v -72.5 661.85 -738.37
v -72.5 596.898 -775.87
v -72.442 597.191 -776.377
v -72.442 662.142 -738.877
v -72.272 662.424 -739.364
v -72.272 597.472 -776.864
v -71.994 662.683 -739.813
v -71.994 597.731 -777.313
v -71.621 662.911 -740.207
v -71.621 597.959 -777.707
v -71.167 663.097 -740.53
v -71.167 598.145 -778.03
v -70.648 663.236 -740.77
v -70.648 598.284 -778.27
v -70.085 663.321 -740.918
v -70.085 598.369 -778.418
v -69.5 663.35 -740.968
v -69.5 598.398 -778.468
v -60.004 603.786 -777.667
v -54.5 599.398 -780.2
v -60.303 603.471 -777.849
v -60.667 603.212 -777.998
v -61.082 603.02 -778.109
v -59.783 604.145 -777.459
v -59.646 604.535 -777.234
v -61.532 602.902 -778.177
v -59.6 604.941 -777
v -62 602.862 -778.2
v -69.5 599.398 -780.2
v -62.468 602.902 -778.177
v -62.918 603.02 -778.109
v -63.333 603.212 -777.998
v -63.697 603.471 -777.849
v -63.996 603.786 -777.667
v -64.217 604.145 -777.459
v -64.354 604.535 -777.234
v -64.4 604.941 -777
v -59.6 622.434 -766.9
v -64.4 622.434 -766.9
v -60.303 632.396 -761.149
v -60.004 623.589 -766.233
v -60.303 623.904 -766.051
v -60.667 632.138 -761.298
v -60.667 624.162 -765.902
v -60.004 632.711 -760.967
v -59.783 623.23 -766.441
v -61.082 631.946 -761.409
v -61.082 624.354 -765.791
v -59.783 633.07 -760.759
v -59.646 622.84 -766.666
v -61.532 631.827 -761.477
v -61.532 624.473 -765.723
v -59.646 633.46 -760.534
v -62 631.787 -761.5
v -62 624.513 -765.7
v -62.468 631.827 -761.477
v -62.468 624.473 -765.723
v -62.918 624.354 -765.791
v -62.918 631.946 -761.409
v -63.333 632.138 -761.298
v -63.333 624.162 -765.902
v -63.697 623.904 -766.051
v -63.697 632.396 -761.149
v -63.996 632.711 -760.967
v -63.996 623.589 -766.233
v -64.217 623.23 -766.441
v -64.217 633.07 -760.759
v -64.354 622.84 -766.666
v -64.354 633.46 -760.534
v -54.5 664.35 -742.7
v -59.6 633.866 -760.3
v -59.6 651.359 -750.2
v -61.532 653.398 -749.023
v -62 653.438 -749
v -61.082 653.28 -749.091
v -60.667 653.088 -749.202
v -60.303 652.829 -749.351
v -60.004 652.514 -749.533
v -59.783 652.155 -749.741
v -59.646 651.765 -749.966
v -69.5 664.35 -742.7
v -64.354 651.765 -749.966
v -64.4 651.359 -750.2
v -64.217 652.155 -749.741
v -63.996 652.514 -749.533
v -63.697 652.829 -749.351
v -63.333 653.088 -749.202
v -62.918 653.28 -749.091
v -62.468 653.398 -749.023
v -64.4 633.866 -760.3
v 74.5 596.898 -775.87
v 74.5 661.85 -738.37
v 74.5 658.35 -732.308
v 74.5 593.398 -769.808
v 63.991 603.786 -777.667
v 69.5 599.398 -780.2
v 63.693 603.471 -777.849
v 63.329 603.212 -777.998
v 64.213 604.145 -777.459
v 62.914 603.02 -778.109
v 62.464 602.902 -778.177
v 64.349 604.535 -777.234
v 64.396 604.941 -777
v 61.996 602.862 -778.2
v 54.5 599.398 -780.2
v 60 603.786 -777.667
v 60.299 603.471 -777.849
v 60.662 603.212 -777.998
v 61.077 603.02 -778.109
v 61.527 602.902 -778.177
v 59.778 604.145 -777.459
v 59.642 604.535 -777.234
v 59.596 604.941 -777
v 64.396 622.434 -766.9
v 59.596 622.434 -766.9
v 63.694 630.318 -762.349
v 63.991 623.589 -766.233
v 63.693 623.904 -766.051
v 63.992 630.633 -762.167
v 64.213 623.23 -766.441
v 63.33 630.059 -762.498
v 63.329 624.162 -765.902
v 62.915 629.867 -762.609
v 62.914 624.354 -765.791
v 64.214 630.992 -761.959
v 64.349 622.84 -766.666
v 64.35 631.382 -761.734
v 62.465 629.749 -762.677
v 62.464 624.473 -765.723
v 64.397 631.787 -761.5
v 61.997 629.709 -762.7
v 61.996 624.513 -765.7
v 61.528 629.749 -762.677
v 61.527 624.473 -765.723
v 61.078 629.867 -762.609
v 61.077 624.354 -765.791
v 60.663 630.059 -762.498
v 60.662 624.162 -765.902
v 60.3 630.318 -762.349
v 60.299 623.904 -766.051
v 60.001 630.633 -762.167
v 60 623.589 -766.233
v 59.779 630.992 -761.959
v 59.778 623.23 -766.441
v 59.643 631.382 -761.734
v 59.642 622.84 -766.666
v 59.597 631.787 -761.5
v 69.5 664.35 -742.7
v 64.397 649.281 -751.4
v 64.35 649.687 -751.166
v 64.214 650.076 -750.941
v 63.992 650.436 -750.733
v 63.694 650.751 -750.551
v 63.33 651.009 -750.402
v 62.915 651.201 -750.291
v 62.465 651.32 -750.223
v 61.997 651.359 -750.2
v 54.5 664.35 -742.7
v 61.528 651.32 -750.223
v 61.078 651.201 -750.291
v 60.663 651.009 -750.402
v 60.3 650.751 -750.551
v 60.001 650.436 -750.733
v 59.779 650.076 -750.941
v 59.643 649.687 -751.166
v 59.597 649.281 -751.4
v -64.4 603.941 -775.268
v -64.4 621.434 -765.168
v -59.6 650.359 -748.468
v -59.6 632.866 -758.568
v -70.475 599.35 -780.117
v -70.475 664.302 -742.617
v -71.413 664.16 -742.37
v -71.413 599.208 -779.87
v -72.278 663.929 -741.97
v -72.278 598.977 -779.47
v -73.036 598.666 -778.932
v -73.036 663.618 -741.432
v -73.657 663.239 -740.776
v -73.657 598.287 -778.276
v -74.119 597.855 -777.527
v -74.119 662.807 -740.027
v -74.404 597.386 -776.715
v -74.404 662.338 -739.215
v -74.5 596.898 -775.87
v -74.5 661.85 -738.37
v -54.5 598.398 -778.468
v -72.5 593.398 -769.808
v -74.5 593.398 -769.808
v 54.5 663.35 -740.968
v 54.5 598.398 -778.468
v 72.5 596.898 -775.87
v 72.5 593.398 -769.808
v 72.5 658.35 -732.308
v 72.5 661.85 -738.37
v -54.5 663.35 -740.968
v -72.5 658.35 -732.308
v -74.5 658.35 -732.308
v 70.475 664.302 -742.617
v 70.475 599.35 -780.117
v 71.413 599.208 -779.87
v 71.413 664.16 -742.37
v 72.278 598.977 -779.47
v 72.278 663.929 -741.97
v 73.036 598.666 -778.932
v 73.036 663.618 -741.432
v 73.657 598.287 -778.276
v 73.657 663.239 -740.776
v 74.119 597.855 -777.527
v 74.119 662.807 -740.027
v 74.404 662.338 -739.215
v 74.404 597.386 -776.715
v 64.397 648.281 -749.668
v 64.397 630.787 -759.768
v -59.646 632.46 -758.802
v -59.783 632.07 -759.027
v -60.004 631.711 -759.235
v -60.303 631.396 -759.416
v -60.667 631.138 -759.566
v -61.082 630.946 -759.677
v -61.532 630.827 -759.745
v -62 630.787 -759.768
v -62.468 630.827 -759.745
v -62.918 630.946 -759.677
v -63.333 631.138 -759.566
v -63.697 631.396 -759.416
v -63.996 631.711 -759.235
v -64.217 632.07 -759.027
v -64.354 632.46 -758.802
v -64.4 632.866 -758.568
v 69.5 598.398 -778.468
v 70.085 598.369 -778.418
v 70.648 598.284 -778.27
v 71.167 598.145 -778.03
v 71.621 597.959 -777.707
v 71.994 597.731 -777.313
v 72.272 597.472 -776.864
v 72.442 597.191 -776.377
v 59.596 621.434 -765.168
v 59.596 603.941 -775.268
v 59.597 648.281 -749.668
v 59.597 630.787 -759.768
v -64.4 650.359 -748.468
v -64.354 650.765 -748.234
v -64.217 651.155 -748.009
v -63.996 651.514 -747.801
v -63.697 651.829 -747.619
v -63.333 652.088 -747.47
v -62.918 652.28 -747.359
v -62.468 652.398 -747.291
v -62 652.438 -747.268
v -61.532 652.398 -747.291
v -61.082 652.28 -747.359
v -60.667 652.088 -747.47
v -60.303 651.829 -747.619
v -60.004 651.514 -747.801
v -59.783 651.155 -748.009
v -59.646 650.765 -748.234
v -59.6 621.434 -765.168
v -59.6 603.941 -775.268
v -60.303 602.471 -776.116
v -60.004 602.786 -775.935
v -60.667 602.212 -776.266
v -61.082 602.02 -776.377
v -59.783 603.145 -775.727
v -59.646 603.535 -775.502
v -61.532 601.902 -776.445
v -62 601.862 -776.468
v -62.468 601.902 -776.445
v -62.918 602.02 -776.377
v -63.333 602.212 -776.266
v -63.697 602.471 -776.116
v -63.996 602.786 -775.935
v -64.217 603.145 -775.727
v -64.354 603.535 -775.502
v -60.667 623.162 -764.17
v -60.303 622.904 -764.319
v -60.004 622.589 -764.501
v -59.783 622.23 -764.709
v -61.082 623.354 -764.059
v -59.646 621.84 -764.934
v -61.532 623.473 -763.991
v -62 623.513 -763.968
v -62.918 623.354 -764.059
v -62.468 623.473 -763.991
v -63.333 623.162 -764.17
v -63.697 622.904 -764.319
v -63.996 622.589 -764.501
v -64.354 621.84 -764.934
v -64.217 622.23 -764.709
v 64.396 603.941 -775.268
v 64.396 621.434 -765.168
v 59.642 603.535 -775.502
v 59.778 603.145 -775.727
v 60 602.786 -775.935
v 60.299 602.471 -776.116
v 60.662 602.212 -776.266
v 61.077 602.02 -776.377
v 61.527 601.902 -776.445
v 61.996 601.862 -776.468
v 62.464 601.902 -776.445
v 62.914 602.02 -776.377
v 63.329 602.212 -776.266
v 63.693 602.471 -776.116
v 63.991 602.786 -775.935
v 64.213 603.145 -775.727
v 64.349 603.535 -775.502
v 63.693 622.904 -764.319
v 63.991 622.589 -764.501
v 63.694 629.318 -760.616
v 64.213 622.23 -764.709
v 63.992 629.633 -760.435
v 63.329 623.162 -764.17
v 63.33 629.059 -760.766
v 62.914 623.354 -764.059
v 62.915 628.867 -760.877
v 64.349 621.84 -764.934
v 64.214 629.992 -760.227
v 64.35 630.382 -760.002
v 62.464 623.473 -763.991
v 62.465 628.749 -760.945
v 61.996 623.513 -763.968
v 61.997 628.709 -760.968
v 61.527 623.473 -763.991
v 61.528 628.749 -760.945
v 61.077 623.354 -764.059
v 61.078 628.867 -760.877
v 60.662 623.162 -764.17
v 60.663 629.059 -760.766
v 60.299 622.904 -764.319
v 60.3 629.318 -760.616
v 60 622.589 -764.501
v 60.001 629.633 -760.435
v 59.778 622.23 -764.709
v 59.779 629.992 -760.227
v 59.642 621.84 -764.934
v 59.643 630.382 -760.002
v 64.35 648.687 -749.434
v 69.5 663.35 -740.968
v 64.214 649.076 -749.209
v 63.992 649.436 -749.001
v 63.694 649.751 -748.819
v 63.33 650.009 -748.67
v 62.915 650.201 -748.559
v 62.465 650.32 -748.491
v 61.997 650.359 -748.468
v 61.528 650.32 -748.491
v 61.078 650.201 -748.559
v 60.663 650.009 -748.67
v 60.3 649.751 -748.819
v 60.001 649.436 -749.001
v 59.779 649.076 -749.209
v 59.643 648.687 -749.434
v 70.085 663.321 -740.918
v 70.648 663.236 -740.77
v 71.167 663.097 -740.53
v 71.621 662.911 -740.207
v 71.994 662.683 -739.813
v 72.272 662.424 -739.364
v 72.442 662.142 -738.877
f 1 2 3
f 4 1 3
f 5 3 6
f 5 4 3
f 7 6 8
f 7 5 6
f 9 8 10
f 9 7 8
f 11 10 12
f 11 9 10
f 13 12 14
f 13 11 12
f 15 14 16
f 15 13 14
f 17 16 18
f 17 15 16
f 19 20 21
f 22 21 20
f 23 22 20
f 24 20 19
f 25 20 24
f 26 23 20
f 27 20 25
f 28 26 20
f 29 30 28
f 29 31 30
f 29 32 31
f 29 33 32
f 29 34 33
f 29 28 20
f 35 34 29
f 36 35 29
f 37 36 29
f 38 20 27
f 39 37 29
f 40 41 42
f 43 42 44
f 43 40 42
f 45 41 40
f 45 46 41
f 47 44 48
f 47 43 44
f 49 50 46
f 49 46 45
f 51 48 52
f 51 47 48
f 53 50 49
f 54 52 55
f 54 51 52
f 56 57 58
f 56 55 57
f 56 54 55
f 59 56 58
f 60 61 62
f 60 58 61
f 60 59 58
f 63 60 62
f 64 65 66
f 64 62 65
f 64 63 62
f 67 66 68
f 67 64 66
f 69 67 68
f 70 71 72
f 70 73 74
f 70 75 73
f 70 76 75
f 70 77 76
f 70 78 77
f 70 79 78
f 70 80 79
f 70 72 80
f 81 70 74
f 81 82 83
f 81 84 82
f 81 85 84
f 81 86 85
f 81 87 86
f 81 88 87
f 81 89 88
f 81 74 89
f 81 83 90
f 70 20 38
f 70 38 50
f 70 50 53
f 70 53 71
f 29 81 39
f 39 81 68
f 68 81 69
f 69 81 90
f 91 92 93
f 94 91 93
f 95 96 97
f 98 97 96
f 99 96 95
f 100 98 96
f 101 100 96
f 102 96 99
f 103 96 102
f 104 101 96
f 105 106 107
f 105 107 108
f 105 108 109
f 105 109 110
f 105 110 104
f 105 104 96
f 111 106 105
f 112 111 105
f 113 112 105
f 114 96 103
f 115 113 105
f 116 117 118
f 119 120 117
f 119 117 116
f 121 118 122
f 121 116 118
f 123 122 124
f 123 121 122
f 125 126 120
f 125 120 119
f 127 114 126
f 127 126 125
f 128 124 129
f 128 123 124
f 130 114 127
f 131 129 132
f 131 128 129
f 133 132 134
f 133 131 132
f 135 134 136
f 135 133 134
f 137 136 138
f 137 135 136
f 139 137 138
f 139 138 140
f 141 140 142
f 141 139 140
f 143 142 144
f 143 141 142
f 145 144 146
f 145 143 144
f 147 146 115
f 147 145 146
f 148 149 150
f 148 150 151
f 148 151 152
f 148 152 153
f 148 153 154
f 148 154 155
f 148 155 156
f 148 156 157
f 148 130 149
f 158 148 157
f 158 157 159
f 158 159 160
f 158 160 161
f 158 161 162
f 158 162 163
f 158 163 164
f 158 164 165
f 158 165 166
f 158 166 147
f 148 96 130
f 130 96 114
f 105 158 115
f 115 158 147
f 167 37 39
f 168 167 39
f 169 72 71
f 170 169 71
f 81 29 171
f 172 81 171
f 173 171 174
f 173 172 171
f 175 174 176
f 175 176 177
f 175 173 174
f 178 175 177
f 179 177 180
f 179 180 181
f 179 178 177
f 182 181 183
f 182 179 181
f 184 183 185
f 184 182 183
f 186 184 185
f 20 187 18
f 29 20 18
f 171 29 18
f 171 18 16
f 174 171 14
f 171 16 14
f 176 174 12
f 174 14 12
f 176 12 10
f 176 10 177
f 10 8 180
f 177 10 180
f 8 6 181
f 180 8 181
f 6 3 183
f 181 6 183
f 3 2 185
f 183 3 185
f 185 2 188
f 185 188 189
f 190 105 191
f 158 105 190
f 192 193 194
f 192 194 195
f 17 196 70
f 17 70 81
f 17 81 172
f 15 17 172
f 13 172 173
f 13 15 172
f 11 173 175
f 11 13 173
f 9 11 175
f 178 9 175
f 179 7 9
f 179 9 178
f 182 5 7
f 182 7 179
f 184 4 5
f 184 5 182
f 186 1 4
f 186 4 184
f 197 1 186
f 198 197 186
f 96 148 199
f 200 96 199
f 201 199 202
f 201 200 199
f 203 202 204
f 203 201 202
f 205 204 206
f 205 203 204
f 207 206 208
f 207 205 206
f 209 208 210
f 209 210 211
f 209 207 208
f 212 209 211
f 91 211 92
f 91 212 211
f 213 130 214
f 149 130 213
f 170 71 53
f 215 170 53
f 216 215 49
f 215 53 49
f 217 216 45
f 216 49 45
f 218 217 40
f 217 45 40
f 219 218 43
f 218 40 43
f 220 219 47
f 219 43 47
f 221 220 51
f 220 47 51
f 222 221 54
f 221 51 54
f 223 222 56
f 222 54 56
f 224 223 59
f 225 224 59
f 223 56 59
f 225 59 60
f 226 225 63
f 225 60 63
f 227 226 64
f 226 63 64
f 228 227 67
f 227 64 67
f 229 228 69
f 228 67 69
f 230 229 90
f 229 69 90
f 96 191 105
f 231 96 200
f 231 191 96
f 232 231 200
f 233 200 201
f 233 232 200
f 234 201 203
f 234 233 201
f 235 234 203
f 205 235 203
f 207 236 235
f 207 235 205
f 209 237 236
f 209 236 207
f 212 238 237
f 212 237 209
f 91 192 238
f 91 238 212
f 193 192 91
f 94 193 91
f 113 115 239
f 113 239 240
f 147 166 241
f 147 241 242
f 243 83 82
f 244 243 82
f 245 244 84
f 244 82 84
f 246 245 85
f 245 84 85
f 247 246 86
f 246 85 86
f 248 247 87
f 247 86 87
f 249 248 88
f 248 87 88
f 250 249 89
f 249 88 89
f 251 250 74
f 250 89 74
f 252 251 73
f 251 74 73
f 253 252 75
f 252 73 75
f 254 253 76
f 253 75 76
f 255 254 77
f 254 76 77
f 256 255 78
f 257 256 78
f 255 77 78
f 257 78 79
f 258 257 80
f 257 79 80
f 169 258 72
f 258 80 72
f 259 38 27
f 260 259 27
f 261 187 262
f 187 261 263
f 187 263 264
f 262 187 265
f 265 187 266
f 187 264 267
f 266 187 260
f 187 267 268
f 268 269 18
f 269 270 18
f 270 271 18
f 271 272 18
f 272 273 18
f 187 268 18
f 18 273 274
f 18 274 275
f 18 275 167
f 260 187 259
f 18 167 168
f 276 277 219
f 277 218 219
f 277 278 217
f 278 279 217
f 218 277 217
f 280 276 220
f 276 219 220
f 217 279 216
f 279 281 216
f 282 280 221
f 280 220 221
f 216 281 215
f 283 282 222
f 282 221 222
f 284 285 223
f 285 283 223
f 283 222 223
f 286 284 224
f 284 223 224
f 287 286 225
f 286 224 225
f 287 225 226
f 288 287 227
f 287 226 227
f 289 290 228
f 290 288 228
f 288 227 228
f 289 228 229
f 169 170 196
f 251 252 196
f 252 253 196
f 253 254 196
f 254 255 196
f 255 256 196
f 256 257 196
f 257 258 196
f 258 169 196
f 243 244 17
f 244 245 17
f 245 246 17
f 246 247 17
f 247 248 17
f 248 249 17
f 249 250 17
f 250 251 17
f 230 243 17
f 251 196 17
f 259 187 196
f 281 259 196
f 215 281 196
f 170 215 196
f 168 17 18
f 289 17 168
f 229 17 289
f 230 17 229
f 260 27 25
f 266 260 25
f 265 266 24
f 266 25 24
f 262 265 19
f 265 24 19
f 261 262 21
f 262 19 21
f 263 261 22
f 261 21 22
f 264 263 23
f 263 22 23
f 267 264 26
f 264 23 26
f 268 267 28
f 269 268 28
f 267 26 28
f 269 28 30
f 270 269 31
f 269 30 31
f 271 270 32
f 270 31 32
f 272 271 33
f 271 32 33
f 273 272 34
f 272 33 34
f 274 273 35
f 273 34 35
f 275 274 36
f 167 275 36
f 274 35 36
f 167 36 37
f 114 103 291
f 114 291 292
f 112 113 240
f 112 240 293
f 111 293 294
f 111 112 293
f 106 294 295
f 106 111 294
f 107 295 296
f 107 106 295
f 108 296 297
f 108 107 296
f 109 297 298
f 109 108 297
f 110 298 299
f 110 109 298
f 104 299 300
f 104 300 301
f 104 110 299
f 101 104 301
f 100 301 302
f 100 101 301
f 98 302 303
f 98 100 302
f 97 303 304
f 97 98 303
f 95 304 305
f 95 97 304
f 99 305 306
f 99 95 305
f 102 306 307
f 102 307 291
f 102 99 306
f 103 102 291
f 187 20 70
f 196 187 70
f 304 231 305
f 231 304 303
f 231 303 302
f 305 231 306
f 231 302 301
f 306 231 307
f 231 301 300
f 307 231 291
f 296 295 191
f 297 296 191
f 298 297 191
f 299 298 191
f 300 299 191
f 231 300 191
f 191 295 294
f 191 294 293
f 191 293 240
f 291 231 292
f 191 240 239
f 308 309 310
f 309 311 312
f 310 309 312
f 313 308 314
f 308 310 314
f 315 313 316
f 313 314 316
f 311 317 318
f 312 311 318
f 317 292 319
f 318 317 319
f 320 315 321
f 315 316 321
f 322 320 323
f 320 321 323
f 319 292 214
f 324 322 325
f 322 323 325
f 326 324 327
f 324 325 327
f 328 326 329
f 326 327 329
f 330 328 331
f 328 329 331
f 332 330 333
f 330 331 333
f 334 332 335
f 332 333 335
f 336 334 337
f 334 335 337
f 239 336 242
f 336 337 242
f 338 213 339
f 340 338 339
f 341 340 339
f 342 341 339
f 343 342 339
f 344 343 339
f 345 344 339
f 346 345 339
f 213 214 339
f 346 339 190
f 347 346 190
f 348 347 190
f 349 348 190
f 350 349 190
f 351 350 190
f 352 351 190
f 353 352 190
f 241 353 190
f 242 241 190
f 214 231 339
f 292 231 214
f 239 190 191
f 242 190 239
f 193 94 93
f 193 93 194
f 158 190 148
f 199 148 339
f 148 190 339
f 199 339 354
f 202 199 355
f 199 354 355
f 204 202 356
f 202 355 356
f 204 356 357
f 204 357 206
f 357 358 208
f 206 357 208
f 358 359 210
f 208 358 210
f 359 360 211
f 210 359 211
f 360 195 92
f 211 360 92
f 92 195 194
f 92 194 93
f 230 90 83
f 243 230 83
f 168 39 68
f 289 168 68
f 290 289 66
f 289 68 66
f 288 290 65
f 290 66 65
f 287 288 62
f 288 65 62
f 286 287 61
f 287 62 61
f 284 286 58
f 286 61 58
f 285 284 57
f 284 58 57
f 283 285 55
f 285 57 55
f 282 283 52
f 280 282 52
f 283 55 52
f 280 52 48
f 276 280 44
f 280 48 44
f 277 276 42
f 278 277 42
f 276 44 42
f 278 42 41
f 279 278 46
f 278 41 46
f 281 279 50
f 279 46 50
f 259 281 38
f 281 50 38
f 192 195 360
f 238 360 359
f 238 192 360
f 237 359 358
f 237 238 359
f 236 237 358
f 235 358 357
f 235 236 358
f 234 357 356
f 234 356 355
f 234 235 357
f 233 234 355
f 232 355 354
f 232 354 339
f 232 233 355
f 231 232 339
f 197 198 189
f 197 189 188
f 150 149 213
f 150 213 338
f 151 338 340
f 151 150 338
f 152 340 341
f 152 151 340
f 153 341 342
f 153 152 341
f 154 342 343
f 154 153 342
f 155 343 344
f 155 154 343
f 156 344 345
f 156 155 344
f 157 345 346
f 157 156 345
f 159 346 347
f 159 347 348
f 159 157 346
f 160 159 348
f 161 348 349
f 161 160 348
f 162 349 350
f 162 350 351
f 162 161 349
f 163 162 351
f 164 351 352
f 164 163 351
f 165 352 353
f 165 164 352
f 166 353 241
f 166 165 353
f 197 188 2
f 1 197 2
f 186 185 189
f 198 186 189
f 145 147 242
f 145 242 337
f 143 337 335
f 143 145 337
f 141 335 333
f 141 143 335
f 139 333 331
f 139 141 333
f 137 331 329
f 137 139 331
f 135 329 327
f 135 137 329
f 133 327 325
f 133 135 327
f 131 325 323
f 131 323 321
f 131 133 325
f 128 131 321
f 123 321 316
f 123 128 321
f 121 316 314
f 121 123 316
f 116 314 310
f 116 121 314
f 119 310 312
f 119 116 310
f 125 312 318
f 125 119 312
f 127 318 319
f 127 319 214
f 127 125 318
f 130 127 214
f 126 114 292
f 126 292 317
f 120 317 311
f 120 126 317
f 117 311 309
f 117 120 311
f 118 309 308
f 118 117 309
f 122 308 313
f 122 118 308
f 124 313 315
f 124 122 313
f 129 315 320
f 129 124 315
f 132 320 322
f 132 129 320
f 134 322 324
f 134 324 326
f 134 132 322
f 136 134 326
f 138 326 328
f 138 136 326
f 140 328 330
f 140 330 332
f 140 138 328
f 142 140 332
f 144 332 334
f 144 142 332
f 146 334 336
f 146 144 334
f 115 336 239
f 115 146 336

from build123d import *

# Parameters (mm, degrees)
SKETCH2_W              = 15
SKETCH2_H              = 75
BASE_FLANGE2_DEPTH     = 2
SM_EDGE_FLANGE_2_DEPTH = 75
SKETCH12_W             = 15
SKETCH12_H             = 75
BASE_FLANGE3_DEPTH     = 2
SM_EDGE_FLANGE_3_DEPTH = 75


# Sheet-metal steps are written as plain solids
with BuildPart() as part:
    # Sketch2 → Base-Flange2 (new body)
    with BuildSketch(Plane(origin=(1.391e-06, 487.685994213, -844.696920117), x_dir=(-1.0, 7.129193608778373e-10, -1.2348125547399519e-09), z_dir=(1.4258387217556799e-09, 0.4999999999999983, -0.8660254037844398))):
        with Locations((-62.000004193, 166.493857073)):
            Rectangle(SKETCH2_W, SKETCH2_H)
        with BuildLine():
            Line((-59.596560145, 186.593857073), (-59.596560145, 166.393857073))
            ThreePointArc((-59.596560145, 166.393857073), (-61.996560145, 163.993857073), (-64.396560145, 166.393857073))
            Line((-64.396560145, 166.393857073), (-64.396560145, 186.593857073))
            ThreePointArc((-64.396560145, 186.593857073), (-61.996560145, 188.993857073), (-59.596560145, 186.593857073))
        make_face(mode=Mode.SUBTRACT)
        with BuildLine():
            Line((-59.595570898, 155.593857073), (-59.595570898, 135.393857073))
            ThreePointArc((-59.595570898, 135.393857073), (-61.995570898, 132.993857073), (-64.395570898, 135.393857073))
            Line((-64.395570898, 135.393857073), (-64.395570898, 155.593857073))
            ThreePointArc((-64.395570898, 155.593857073), (-61.995570898, 157.993857073), (-59.595570898, 155.593857073))
        make_face(mode=Mode.SUBTRACT)
    extrude(amount=-BASE_FLANGE2_DEPTH)

    # 邊線-凸緣2 section (across the edge) → 邊線-凸緣2 (add)
    with BuildSketch(Plane(origin=(72.50000558, 598.397951319, -778.467940683), x_dir=(-1.0, 7.129173158057236e-10, -1.2348090125711463e-09), z_dir=(0, 0.8660254037844398, 0.49999999999999817))):
        with BuildLine():
            Line((-2, 3), (-2, 10))
            Line((-2, 10), (0, 10))
            Line((0, 10), (0, 3))
            ThreePointArc((0, 3), (0.878679656, 0.878679656), (3, 0))
            Line((3, 0), (3, -2))
            ThreePointArc((3, -2), (-0.535533906, -0.535533906), (-2, 3))
        make_face()
    extrude(amount=SM_EDGE_FLANGE_2_DEPTH)


with BuildPart() as body_2:
    # Sketch12 → Base-Flange3 (new body)
    with BuildSketch(Plane(origin=(1.391e-06, 487.685994213, -844.696920117), x_dir=(-1.0, 7.129193608778373e-10, -1.2348125547399519e-09), z_dir=(1.4258387217556799e-09, 0.4999999999999983, -0.8660254037844398))):
        with Locations((62.000003094, 166.493857379)):
            Rectangle(SKETCH12_W, SKETCH12_H)
        with BuildLine():
            Line((59.600003094, 155.593857379), (59.600003094, 135.393857379))
            ThreePointArc((59.600003094, 135.393857379), (62.000003094, 132.993857379), (64.400003094, 135.393857379))
            Line((64.400003094, 135.393857379), (64.400003094, 155.593857379))
            ThreePointArc((64.400003094, 155.593857379), (62.000003094, 157.993857379), (59.600003094, 155.593857379))
        make_face(mode=Mode.SUBTRACT)
        with BuildLine():
            Line((59.600003094, 188.993857379), (59.600003094, 168.793857379))
            ThreePointArc((59.600003094, 168.793857379), (62.000003094, 166.393857379), (64.400003094, 168.793857379))
            Line((64.400003094, 168.793857379), (64.400003094, 188.993857379))
            ThreePointArc((64.400003094, 188.993857379), (62.000003094, 191.393857379), (59.600003094, 188.993857379))
        make_face(mode=Mode.SUBTRACT)
    extrude(amount=-BASE_FLANGE3_DEPTH)

    # 邊線-凸緣3 section (across the edge) → 邊線-凸緣3 (add)
    with BuildSketch(Plane(origin=(-72.500001706, 663.349856971, -740.967940709), x_dir=(1.0, -7.1292094177144e-10, 1.2348149228536517e-09), z_dir=(0, -0.8660254037844398, -0.49999999999999817))):
        with BuildLine():
            Line((-2, 3), (-2, 10))
            Line((-2, 10), (0, 10))
            Line((0, 10), (0, 3))
            ThreePointArc((0, 3), (0.878679656, 0.878679656), (3, 0))
            Line((3, 0), (3, -2))
            ThreePointArc((3, -2), (-0.535533906, -0.535533906), (-2, 3))
        make_face()
    extrude(amount=SM_EDGE_FLANGE_3_DEPTH)


solid = Compound([part.part, body_2.part])
